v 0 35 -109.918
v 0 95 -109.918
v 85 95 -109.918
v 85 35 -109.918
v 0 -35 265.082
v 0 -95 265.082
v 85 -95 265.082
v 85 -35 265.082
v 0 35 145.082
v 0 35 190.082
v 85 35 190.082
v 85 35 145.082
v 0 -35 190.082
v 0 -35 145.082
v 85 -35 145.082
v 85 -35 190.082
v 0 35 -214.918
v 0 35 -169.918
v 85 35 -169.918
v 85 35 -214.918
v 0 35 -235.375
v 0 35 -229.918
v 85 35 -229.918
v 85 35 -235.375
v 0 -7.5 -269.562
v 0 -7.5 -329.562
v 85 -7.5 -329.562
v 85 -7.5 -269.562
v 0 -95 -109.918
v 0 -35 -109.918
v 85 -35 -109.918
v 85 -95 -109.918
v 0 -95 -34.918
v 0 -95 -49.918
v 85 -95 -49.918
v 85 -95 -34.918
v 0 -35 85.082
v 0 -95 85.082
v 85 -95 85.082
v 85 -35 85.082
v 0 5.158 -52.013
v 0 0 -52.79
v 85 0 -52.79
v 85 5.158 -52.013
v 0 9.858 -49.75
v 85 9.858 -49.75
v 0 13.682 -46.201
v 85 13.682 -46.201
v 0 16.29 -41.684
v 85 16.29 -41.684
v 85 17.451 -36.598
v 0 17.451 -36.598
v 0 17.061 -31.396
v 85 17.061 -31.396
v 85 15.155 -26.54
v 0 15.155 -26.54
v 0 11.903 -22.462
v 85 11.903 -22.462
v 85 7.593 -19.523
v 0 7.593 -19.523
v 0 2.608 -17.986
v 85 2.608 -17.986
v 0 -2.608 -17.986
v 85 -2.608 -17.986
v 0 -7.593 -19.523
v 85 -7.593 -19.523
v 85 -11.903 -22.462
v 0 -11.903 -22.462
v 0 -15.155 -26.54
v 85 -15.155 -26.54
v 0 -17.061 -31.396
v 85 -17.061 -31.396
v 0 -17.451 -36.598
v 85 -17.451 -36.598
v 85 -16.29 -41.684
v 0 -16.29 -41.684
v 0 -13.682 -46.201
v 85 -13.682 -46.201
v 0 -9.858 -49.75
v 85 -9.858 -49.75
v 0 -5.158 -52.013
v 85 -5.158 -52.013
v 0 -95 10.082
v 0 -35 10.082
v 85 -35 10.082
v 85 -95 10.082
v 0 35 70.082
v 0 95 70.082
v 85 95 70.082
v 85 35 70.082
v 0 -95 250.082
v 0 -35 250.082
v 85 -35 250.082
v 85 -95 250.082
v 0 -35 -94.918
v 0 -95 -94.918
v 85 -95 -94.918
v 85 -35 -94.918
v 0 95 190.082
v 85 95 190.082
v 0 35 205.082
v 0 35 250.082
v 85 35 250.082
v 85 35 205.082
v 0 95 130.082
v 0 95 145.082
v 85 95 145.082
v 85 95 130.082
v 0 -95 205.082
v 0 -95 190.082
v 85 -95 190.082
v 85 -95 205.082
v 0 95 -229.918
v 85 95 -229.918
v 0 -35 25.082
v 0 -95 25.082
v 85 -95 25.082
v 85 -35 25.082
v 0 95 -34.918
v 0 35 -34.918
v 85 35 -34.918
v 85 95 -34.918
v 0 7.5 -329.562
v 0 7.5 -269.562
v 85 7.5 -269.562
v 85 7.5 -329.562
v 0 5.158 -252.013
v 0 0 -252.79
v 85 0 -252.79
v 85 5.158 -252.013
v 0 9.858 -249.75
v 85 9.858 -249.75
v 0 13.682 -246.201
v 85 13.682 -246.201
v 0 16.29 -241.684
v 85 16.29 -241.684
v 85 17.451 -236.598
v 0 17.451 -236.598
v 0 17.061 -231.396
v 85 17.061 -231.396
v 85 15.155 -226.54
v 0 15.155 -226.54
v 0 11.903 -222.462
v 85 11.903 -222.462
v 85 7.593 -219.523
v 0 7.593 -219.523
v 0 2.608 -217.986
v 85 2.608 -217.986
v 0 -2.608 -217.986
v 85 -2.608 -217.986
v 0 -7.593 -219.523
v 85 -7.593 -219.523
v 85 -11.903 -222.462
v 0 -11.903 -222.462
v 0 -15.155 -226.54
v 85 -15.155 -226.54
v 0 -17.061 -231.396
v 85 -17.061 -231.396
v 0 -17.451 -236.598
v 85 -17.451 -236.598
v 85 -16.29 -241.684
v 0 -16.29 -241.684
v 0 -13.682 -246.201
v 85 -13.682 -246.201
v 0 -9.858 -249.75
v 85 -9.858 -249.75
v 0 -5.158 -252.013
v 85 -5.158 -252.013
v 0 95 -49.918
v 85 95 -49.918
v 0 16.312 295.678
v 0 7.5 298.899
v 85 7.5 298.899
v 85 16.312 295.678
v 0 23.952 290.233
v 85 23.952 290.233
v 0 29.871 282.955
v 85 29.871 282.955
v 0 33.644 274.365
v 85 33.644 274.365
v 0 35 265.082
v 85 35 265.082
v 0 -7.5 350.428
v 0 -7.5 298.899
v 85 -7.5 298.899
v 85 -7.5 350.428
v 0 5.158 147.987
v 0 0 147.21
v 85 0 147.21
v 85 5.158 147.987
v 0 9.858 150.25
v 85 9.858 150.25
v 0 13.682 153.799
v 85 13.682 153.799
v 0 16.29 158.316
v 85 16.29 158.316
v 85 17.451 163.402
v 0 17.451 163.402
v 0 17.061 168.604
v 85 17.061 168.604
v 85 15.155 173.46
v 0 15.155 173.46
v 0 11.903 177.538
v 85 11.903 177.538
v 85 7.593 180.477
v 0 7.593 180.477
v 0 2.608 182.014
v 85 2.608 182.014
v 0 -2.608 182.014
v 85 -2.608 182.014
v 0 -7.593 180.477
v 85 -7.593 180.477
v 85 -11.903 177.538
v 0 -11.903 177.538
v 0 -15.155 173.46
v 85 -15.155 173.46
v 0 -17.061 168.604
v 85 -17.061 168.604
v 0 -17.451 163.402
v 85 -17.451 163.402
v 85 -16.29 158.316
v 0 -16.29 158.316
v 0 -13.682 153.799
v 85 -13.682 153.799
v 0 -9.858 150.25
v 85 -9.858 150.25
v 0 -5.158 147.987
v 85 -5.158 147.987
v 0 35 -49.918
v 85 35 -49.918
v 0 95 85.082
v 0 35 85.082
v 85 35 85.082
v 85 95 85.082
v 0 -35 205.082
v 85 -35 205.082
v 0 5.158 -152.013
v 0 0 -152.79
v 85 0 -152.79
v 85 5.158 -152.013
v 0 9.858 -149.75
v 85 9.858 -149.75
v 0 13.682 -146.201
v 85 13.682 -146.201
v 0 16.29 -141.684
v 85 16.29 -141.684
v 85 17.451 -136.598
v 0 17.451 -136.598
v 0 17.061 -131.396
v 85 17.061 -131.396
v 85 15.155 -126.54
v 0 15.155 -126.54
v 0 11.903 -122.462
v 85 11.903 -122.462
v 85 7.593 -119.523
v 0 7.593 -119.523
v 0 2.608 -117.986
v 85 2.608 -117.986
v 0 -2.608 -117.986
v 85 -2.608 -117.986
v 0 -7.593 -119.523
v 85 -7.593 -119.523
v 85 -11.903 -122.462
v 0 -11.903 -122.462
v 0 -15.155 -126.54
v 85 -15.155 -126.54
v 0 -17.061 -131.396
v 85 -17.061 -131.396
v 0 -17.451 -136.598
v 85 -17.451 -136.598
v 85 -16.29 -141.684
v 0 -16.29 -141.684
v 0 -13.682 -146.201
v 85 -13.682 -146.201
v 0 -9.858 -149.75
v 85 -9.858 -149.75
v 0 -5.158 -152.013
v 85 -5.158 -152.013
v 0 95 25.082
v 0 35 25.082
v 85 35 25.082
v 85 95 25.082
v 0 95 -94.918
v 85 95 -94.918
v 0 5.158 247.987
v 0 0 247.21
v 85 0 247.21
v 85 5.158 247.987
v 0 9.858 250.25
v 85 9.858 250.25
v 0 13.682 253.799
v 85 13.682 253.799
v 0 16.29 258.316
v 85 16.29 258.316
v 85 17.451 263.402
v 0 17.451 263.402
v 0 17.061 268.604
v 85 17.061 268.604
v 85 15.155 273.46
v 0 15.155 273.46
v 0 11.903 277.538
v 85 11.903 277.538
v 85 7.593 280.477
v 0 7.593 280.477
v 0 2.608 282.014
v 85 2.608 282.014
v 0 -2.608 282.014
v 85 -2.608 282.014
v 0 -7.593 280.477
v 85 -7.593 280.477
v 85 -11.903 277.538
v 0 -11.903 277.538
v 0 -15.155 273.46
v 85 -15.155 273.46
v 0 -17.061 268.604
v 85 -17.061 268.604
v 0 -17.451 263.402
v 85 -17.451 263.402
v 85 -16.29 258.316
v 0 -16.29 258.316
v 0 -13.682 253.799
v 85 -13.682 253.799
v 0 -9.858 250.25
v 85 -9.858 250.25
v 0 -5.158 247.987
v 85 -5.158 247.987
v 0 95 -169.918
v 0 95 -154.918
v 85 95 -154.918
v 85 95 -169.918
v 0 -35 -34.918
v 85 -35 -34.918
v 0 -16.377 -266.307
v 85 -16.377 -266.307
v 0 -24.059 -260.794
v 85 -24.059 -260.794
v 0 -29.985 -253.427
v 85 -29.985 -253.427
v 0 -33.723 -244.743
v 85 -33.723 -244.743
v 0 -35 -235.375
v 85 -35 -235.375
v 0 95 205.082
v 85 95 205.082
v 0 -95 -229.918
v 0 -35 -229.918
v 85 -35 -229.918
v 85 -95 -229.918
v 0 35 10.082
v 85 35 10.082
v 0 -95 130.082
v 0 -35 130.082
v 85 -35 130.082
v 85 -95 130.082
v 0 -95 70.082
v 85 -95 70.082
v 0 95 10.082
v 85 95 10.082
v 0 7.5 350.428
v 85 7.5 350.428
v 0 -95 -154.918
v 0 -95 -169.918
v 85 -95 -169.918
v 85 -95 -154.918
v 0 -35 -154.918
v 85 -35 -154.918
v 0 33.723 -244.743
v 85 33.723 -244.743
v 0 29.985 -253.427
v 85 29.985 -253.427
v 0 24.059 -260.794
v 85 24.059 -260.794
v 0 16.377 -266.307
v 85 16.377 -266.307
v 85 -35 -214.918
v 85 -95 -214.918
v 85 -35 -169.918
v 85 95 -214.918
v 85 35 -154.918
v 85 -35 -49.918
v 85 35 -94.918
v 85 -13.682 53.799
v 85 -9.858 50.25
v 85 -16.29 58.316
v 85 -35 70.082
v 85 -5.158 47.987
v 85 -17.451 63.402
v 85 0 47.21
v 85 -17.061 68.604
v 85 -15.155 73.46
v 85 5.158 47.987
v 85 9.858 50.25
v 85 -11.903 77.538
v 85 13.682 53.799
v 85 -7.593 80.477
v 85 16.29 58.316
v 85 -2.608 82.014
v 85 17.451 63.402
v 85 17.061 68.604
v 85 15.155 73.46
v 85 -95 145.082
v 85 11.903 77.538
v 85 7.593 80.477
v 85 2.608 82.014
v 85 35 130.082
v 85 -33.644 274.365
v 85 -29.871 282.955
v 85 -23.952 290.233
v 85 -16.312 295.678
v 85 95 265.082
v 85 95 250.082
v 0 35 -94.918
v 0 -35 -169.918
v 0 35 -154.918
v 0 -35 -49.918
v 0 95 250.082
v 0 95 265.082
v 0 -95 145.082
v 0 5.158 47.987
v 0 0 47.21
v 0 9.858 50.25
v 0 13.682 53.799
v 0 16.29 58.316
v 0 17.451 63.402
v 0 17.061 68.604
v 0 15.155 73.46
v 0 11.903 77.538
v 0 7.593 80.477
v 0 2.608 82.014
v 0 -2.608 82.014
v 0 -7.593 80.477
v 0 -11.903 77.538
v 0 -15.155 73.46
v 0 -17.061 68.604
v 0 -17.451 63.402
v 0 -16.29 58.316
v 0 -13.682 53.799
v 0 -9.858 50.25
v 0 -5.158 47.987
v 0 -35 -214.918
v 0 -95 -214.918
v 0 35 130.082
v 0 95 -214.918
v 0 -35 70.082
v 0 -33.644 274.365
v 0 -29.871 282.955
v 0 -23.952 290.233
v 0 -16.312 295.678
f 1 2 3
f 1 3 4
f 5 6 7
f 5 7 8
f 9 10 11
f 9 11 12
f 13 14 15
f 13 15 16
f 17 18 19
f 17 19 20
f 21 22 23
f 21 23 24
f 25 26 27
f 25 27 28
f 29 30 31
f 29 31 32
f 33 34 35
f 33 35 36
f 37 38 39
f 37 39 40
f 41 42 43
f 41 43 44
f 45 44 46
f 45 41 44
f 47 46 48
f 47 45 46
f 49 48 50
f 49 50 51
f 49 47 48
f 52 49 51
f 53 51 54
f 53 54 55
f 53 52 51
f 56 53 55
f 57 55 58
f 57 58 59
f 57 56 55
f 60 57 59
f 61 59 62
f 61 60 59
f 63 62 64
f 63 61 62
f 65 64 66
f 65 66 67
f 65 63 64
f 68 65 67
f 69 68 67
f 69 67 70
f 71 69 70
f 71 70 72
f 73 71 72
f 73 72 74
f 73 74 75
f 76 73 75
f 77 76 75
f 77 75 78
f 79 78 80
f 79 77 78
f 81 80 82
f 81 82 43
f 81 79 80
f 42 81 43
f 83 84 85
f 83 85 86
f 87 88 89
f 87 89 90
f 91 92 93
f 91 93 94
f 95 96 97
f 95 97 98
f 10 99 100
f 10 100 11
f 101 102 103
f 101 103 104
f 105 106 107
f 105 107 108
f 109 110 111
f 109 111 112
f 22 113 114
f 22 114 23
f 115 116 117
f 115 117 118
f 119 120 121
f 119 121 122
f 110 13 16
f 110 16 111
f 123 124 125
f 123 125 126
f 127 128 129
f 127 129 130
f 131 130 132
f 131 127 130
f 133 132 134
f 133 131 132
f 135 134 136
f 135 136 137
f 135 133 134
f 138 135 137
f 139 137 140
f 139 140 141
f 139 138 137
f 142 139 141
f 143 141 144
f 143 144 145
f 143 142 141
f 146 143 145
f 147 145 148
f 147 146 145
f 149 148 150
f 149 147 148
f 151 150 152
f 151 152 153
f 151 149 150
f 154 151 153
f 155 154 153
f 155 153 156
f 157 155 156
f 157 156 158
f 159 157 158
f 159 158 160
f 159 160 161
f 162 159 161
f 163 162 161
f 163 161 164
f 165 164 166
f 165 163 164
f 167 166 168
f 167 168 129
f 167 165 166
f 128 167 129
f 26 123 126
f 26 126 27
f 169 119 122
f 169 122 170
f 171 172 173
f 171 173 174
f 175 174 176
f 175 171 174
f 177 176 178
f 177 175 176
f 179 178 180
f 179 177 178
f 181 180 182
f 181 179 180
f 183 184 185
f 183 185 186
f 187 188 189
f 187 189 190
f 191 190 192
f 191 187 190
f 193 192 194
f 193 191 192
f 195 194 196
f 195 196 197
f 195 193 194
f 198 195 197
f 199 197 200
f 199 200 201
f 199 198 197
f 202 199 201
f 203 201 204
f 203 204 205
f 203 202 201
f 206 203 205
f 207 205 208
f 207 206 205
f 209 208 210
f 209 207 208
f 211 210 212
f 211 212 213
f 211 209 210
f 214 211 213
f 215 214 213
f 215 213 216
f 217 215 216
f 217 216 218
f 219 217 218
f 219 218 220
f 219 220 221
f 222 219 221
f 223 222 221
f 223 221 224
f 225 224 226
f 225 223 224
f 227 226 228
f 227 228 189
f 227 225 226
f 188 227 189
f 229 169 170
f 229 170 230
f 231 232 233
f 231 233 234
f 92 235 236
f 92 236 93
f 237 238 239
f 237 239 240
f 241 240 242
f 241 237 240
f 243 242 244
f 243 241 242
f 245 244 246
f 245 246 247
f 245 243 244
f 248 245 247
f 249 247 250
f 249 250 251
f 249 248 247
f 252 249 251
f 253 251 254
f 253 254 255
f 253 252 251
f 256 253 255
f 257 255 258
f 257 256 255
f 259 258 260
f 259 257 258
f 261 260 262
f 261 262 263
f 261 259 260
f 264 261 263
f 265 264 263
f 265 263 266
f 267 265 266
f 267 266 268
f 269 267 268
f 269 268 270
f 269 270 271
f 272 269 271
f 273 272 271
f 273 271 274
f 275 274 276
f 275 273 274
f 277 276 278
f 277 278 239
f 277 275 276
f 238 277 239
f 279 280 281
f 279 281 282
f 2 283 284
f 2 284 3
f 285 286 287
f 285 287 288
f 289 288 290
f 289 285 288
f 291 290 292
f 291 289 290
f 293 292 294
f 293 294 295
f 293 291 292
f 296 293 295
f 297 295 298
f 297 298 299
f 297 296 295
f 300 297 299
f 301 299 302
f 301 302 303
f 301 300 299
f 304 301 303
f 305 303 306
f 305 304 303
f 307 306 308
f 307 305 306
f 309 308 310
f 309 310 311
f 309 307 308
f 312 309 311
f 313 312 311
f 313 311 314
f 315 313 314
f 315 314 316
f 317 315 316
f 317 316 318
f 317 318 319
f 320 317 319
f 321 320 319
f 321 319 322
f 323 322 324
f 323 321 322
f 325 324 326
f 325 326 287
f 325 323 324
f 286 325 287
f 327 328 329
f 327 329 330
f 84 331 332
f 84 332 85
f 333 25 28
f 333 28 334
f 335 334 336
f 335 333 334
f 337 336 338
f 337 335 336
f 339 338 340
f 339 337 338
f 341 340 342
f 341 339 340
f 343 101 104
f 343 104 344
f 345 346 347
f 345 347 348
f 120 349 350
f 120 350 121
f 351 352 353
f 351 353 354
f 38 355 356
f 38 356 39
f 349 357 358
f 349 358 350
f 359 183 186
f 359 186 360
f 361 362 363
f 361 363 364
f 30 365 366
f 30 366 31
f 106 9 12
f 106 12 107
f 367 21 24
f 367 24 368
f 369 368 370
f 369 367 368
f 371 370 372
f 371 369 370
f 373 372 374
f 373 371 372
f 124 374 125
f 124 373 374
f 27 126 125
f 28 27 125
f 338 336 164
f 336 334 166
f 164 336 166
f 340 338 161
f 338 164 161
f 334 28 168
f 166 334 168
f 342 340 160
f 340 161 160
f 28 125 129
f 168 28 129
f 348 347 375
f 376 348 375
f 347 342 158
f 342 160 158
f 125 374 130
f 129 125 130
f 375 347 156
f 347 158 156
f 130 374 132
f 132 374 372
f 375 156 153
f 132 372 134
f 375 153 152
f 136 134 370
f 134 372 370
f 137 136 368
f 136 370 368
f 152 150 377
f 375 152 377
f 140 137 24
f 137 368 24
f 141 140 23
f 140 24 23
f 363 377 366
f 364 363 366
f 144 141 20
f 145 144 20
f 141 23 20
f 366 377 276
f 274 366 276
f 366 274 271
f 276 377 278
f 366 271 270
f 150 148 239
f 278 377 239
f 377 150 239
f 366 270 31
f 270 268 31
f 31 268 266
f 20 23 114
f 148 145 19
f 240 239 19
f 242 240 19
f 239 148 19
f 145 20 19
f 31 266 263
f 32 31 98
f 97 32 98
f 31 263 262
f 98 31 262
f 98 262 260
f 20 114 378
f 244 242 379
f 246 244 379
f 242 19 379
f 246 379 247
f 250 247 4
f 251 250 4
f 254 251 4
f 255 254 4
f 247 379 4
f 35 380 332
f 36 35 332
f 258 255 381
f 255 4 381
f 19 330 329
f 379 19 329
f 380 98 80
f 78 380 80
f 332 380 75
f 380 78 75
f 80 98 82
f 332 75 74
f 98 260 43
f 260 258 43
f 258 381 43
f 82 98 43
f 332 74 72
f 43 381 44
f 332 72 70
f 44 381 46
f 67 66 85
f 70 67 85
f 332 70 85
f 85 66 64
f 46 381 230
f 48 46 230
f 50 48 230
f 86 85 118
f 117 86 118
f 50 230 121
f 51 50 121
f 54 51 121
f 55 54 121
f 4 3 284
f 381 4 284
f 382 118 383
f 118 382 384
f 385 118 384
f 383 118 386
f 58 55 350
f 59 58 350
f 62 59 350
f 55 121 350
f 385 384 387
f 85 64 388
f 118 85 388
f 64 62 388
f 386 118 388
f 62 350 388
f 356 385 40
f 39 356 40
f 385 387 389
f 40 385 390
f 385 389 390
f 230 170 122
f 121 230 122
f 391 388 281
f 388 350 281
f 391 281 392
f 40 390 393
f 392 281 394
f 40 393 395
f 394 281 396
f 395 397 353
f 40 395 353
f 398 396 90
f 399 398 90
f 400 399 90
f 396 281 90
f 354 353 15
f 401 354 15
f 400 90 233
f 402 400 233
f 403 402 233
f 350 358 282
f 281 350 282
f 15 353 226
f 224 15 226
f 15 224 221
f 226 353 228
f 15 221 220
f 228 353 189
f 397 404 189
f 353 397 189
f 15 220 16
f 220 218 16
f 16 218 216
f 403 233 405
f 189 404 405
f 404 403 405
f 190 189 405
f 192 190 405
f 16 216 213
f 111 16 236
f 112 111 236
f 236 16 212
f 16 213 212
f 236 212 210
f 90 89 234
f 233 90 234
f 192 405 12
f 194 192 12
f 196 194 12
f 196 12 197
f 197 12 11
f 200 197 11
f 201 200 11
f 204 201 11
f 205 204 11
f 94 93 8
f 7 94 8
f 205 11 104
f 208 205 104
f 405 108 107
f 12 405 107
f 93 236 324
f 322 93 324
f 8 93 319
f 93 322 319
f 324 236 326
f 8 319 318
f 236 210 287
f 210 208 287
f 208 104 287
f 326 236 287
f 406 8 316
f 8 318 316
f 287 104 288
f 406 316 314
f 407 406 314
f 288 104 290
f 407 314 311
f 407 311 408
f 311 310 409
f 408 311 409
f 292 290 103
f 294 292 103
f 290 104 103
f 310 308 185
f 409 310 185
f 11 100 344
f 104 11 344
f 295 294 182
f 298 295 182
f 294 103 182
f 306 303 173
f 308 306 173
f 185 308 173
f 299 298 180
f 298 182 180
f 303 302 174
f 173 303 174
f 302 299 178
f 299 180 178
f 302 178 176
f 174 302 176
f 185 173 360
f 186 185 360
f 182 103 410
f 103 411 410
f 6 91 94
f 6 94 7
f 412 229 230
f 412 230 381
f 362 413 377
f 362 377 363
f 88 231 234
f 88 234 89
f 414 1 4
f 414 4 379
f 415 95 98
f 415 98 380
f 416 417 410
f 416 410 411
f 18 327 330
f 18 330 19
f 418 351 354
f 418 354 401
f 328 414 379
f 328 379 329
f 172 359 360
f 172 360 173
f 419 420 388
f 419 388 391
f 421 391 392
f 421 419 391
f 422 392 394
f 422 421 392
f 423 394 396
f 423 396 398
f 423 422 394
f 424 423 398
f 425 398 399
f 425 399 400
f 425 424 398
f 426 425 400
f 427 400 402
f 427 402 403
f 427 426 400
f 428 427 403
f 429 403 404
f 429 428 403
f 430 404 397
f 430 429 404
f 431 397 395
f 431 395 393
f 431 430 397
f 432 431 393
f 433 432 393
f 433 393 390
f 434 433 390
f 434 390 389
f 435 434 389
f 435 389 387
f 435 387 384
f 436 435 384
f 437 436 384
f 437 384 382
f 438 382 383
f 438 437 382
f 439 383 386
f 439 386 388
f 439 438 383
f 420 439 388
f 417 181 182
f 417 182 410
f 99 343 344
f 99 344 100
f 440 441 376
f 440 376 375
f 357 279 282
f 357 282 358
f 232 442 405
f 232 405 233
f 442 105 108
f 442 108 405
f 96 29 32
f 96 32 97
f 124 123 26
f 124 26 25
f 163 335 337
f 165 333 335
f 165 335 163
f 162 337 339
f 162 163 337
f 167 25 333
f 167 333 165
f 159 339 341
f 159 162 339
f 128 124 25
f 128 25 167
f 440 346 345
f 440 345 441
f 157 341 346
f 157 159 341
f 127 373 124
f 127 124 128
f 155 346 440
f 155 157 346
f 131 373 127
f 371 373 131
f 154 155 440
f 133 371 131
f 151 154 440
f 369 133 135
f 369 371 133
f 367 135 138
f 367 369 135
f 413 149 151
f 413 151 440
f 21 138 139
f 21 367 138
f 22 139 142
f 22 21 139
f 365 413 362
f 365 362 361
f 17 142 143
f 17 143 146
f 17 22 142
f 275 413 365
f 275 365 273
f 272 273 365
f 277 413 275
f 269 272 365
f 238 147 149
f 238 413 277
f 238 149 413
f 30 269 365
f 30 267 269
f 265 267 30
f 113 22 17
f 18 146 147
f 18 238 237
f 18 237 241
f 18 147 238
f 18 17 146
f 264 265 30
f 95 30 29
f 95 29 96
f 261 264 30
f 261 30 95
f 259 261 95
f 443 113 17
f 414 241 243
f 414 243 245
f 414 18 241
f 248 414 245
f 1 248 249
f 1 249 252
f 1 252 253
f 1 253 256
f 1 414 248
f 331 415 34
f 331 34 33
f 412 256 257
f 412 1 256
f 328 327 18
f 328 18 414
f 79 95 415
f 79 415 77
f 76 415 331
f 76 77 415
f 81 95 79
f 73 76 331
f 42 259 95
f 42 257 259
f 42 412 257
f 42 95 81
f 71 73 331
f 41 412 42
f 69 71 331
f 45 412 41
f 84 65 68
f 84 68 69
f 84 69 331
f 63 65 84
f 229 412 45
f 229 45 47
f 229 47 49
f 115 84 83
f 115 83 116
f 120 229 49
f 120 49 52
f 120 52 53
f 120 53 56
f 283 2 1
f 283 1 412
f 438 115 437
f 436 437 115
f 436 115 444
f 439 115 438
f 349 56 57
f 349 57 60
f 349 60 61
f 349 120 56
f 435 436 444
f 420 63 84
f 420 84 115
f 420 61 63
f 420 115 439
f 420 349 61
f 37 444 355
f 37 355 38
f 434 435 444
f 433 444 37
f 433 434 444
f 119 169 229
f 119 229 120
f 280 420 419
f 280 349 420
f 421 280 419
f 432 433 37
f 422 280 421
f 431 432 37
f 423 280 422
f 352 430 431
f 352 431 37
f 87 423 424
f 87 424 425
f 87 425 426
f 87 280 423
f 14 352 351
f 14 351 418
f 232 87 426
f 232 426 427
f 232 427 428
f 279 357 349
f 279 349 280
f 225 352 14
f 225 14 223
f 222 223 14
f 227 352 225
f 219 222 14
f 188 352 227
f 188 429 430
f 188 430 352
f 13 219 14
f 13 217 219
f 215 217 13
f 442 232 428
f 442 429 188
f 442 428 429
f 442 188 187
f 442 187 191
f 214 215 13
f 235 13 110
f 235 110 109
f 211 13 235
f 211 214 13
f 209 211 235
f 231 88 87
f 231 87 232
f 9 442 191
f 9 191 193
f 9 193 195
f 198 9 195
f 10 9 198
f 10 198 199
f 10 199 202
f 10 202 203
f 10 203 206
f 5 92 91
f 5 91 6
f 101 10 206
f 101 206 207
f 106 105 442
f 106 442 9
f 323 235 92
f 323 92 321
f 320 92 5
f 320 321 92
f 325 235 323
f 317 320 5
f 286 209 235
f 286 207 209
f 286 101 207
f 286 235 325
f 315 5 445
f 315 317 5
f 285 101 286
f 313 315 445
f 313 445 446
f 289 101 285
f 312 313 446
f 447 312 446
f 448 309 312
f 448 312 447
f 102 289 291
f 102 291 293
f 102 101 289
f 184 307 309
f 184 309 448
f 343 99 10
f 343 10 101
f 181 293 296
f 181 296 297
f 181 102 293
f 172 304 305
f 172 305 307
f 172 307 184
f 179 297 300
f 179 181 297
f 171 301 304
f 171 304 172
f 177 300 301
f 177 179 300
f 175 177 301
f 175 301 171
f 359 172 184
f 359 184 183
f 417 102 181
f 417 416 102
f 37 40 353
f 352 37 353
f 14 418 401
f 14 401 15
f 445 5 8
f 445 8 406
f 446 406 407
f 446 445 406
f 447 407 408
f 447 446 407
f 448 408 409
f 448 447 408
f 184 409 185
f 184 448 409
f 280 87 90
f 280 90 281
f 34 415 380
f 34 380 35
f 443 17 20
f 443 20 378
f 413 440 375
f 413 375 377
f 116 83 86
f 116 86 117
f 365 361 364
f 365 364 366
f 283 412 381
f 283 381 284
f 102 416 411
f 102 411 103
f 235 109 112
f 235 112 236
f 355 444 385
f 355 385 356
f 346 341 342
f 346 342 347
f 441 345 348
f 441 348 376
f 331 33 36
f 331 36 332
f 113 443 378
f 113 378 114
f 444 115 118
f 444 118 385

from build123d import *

# Parameters (mm, degrees)
SKETCH1_R           = 17.5
BOSS_EXTRUDE1_DEPTH = 85


with BuildPart() as part:
    # Sketch1 → Boss-Extrude1 (new body)
    with BuildSketch(Plane(origin=(0, 0, 0), x_dir=(0, 0, -1), z_dir=(1, 0, 0))):
        with BuildLine():
            Line((-250.081967213, 35), (-205.081967213, 35))
            Line((-205.081967213, 35), (-205.081967213, 95))
            Line((-205.081967213, 95), (-190.081967213, 95))
            Line((-190.081967213, 95), (-190.081967213, 35))
            Line((-190.081967213, 35), (-185.081967213, 35))
            Line((-185.081967213, 35), (-145.081967213, 35))
            Line((-145.081967213, 35), (-145.081967213, 95))
            Line((-145.081967213, 95), (-130.081967213, 95))
            Line((-130.081967213, 95), (-130.081967213, 35))
            Line((-130.081967213, 35), (-85.081967213, 35))
            Line((-85.081967213, 35), (-85.081967213, 95))
            Line((-85.081967213, 95), (-70.081967213, 95))
            Line((-70.081967213, 95), (-70.081967213, 35))
            Line((-70.081967213, 35), (-25.081967213, 35))
            Line((-25.081967213, 35), (-25.081967213, 95))
            Line((-25.081967213, 95), (-10.081967213, 95))
            Line((-10.081967213, 95), (-10.081967213, 35))
            Line((-10.081967213, 35), (34.918032787, 35))
            Line((34.918032787, 35), (34.918032787, 95))
            Line((34.918032787, 95), (49.918032787, 95))
            Line((49.918032787, 95), (49.918032787, 35))
            Line((49.918032787, 35), (94.918032787, 35))
            Line((94.918032787, 35), (94.918032787, 95))
            Line((94.918032787, 95), (109.918032787, 95))
            Line((109.918032787, 95), (109.918032787, 35))
            Line((109.918032787, 35), (154.918032787, 35))
            Line((154.918032787, 35), (154.918032787, 95))
            Line((154.918032787, 95), (169.918032787, 95))
            Line((169.918032787, 95), (169.918032787, 35))
            Line((169.918032787, 35), (214.918032787, 35))
            Line((214.918032787, 35), (214.918032787, 95))
            Line((214.918032787, 95), (229.918032787, 95))
            Line((229.918032787, 95), (229.918032787, 35))
            Line((229.918032787, 35), (235.374517149, 35))
            ThreePointArc((235.374517149, 35), (257.311928117, 27.271780287), (269.561502977, 7.5))
            Line((269.561502977, 7.5), (329.561502977, 7.5))
            Line((329.561502977, 7.5), (329.561502977, -7.5))
            Line((329.561502977, -7.5), (269.561502977, -7.5))
            ThreePointArc((269.561502977, -7.5), (257.311928117, -27.271780287), (235.374517149, -35))
            Line((235.374517149, -35), (229.918032787, -35))
            Line((229.918032787, -35), (229.918032787, -95))
            Line((229.918032787, -95), (214.918032787, -95))
            Line((214.918032787, -95), (214.918032787, -35))
            Line((214.918032787, -35), (169.918032787, -35))
            Line((169.918032787, -35), (169.918032787, -95))
            Line((169.918032787, -95), (154.918032787, -95))
            Line((154.918032787, -95), (154.918032787, -35))
            Line((154.918032787, -35), (109.918032787, -35))
            Line((109.918032787, -35), (109.918032787, -95))
            Line((109.918032787, -95), (94.918032787, -95))
            Line((94.918032787, -95), (94.918032787, -35))
            Line((94.918032787, -35), (49.918032787, -35))
            Line((49.918032787, -35), (49.918032787, -95))
            Line((49.918032787, -95), (34.918032787, -95))
            Line((34.918032787, -95), (34.918032787, -35))
            Line((34.918032787, -35), (-10.081967213, -35))
            Line((-10.081967213, -35), (-10.081967213, -95))
            Line((-10.081967213, -95), (-25.081967213, -95))
            Line((-25.081967213, -95), (-25.081967213, -35))
            Line((-25.081967213, -35), (-70.081967213, -35))
            Line((-70.081967213, -35), (-70.081967213, -95))
            Line((-70.081967213, -95), (-85.081967213, -95))
            Line((-85.081967213, -95), (-85.081967213, -35))
            Line((-85.081967213, -35), (-130.081967213, -35))
            Line((-130.081967213, -35), (-130.081967213, -95))
            Line((-130.081967213, -95), (-145.081967213, -95))
            Line((-145.081967213, -95), (-145.081967213, -35))
            Line((-145.081967213, -35), (-190.081967213, -35))
            Line((-190.081967213, -35), (-190.081967213, -95))
            Line((-190.081967213, -95), (-205.081967213, -95))
            Line((-205.081967213, -95), (-205.081967213, -35))
            Line((-205.081967213, -35), (-250.081967213, -35))
            Line((-250.081967213, -35), (-250.081967213, -95))
            Line((-250.081967213, -95), (-265.081967213, -95))
            Line((-265.081967213, -95), (-265.081967213, -35))
            ThreePointArc((-265.081967213, -35), (-286.793224125, -27.156121863), (-298.898676377, -7.5))
            Line((-298.898676377, -7.5), (-350.428459553, -7.5))
            Line((-350.428459553, -7.5), (-350.428459553, 7.5))
            Line((-350.428459553, 7.5), (-298.898676377, 7.5))
            ThreePointArc((-298.898676377, 7.5), (-286.793224125, 27.156121863), (-265.081967213, 35))
            Line((-265.081967213, 35), (-265.081967213, 95))
            Line((-265.081967213, 95), (-250.081967213, 95))
            Line((-250.081967213, 95), (-250.081967213, 35))
        make_face()
        with Locations((-264.709663373, 0)):
            Circle(SKETCH1_R, mode=Mode.SUBTRACT)
        with Locations((-164.709663373, 0)):
            Circle(SKETCH1_R, mode=Mode.SUBTRACT)
        with Locations((-64.709663373, 0)):
            Circle(SKETCH1_R, mode=Mode.SUBTRACT)
        with Locations((35.290336627, 0)):
            Circle(SKETCH1_R, mode=Mode.SUBTRACT)
        with Locations((135.290336627, 0)):
            Circle(SKETCH1_R, mode=Mode.SUBTRACT)
        with Locations((235.290336627, 0)):
            Circle(SKETCH1_R, mode=Mode.SUBTRACT)
    extrude(amount=BOSS_EXTRUDE1_DEPTH)


solid = part.part
